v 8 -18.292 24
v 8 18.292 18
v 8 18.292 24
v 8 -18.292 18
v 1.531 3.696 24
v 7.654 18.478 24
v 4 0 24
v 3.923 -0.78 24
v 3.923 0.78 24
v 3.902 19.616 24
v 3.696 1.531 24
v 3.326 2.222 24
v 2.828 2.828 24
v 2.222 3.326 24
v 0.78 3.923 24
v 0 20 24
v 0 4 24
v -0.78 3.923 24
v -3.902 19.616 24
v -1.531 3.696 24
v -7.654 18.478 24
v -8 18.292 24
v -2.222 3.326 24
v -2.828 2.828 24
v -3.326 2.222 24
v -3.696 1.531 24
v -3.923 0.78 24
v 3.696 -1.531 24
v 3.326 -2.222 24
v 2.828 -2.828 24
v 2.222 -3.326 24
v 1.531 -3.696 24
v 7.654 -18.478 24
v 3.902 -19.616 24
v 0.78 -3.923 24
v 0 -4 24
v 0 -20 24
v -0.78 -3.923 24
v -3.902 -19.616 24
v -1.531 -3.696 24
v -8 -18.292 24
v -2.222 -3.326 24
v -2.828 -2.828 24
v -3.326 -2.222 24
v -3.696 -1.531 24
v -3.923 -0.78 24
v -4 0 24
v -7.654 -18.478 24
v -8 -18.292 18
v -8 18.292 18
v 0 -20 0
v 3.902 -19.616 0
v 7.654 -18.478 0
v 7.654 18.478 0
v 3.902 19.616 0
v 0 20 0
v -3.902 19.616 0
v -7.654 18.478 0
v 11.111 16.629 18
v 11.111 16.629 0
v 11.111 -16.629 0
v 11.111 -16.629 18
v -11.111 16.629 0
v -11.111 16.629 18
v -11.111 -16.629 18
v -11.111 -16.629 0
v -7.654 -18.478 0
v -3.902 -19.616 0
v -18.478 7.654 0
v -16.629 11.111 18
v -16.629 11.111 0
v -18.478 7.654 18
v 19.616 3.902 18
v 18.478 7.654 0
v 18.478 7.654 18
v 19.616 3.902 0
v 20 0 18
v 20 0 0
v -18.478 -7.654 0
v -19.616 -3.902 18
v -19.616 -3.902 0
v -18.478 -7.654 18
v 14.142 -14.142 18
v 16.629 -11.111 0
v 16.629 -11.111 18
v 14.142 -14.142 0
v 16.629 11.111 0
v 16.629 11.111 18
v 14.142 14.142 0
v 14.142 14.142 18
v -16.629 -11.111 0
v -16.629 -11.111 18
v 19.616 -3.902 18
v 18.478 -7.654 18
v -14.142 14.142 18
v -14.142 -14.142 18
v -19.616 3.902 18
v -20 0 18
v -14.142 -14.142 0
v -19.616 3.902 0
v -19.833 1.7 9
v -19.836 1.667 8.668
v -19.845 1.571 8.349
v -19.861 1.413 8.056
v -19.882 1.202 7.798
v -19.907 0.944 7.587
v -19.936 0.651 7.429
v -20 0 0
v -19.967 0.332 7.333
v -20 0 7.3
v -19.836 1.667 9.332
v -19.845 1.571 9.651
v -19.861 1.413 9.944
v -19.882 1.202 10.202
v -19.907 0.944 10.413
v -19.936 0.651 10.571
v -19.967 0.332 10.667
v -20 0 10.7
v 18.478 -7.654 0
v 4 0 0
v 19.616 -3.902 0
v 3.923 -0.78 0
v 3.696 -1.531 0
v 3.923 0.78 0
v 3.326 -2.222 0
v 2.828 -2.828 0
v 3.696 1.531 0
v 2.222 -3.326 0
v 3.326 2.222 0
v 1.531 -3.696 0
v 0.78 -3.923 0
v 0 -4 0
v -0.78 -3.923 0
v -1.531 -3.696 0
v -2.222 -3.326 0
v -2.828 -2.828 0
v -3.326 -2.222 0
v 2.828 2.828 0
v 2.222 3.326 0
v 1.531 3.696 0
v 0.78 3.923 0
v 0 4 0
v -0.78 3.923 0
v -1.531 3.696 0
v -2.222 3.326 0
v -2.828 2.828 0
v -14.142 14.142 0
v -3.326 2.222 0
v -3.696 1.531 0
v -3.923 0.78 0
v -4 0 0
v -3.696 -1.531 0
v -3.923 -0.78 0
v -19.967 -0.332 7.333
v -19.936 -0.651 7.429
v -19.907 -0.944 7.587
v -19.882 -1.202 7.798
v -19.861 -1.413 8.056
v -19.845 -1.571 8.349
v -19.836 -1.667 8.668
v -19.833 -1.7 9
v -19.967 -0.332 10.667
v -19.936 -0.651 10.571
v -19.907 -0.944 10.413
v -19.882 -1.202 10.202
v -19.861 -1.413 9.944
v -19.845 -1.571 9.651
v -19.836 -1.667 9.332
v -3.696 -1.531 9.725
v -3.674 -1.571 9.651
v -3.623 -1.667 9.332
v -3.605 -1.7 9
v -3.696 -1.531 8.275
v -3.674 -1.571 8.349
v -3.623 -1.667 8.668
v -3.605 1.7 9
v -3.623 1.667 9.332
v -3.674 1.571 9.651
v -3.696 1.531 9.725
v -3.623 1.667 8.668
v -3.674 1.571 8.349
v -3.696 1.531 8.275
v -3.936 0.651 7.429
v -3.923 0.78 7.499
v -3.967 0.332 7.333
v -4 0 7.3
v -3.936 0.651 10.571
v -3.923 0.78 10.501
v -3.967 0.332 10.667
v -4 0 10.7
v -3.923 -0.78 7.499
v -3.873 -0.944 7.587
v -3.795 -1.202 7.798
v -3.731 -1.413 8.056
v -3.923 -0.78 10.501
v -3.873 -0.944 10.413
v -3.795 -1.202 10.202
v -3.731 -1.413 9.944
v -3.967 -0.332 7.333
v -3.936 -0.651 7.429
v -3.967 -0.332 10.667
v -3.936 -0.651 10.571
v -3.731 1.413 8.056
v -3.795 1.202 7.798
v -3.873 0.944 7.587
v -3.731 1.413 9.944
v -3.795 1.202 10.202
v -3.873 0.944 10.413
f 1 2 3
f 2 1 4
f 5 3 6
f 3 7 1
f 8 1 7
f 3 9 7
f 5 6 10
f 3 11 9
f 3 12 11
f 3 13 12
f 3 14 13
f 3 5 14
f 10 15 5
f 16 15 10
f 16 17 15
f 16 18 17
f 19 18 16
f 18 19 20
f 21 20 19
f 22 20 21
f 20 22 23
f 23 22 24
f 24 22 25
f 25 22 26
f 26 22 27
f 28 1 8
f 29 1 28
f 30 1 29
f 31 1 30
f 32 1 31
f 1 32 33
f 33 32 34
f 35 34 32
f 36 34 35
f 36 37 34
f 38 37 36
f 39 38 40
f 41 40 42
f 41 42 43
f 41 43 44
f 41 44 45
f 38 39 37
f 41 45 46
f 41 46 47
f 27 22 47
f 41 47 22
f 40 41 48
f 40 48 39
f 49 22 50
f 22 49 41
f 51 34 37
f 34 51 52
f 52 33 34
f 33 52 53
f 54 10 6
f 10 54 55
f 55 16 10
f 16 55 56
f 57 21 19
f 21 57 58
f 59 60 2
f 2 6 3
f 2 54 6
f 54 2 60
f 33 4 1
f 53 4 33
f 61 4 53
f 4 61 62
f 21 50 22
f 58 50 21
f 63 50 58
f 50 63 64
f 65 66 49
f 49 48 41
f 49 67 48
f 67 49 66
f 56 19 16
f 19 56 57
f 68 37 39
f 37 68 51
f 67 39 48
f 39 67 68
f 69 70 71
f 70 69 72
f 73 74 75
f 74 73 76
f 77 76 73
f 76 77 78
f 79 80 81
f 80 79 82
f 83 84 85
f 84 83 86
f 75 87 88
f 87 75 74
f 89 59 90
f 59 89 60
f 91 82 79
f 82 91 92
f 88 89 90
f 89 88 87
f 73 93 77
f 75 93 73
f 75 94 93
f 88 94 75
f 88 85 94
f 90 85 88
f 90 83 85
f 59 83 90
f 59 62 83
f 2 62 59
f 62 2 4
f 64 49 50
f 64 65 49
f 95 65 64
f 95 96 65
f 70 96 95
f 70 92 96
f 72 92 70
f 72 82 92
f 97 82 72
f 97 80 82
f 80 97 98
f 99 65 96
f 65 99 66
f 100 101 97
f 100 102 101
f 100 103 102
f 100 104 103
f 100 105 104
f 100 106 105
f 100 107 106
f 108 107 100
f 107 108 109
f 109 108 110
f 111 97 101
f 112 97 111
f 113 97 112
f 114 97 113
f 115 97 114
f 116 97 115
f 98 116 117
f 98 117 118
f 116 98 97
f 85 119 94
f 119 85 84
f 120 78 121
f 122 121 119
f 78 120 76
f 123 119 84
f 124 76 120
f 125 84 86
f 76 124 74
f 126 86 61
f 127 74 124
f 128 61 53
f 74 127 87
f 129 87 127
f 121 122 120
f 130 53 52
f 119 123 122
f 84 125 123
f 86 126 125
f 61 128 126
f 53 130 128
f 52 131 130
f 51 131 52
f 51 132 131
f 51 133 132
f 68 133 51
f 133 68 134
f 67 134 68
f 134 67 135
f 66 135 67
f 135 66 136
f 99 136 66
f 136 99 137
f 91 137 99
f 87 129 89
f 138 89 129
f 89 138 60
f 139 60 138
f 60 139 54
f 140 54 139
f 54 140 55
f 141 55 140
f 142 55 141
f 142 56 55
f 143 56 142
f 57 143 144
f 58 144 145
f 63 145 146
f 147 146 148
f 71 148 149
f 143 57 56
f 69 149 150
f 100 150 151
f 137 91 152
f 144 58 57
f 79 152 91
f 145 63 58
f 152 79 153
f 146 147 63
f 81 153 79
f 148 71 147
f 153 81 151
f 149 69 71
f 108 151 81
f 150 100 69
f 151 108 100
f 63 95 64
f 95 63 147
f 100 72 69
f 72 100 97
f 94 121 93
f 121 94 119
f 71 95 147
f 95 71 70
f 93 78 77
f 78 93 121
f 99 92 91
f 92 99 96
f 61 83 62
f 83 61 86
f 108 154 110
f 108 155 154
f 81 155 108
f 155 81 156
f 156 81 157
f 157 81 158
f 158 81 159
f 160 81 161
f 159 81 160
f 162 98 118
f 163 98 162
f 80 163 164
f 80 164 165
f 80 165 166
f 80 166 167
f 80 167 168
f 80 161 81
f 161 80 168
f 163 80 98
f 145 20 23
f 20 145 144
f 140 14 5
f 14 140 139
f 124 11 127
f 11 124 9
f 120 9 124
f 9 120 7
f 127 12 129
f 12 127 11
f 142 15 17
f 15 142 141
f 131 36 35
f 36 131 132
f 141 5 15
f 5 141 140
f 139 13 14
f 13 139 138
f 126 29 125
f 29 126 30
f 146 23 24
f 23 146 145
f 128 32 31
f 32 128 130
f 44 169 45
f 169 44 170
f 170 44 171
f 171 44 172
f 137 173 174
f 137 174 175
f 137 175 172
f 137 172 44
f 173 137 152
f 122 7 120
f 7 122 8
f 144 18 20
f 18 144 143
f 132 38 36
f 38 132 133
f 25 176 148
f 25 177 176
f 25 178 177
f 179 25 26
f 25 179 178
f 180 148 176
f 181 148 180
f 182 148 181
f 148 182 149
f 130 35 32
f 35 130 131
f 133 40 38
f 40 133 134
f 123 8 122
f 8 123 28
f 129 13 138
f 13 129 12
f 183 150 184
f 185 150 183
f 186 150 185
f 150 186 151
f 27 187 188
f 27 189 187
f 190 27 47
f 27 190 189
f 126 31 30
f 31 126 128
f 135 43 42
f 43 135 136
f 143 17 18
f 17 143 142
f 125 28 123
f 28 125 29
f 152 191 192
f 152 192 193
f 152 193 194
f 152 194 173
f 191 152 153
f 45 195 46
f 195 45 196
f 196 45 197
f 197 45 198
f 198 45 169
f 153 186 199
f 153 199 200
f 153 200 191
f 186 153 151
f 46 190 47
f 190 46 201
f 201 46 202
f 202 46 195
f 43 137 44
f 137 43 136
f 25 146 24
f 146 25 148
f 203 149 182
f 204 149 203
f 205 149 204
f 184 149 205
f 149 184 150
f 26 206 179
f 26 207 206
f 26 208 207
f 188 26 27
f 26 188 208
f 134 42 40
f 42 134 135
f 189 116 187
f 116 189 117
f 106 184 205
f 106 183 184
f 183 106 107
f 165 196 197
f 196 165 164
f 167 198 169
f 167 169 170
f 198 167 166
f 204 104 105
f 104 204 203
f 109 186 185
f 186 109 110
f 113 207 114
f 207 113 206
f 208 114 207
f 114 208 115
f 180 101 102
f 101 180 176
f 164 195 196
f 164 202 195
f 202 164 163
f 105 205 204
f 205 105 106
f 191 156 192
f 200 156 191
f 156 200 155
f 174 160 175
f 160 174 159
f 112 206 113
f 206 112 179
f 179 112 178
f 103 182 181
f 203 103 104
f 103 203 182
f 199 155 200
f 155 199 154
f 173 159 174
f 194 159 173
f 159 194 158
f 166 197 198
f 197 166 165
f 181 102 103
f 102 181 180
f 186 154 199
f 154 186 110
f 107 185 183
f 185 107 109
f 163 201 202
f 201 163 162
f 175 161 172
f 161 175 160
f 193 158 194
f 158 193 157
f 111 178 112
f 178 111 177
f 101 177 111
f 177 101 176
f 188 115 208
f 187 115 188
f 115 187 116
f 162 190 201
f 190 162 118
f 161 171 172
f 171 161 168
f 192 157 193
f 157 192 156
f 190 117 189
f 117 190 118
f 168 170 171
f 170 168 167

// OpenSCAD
$fn = 32;

// ----------------------------------------------------------------------
// Oldham coupling hub: 40 x 24 mm
// ----------------------------------------------------------------------

// --- parameters (mm) ---
body_d = 40;              // hub diameter
body_l = 18;              // hub length
shaft_d = 8;              // shaft bore
cam_w = 16;               // drive tongue width
tongue_h = 6;             // drive tongue height
set_d = 3.4;              // set screw tap hole

module hub() {
  cylinder(h = body_l, d = body_d);
  /* tongue, clipped to the hub disc and sunk 1 mm into the face */
  intersection() {
    translate([-cam_w / 2, -body_d / 2, body_l - 1])
      cube([cam_w, body_d, tongue_h + 1]);
    translate([0, 0, body_l - 1]) cylinder(h = tongue_h + 1, d = body_d);
  }
}

difference() {
  hub();
  translate([0, 0, -1]) cylinder(h = body_l + tongue_h + 2, d = shaft_d);
  translate([-body_d / 2 - 1, 0, body_l * 0.5])
    rotate([0, 90, 0]) cylinder(h = body_d / 2 + 2, d = set_d);
}
